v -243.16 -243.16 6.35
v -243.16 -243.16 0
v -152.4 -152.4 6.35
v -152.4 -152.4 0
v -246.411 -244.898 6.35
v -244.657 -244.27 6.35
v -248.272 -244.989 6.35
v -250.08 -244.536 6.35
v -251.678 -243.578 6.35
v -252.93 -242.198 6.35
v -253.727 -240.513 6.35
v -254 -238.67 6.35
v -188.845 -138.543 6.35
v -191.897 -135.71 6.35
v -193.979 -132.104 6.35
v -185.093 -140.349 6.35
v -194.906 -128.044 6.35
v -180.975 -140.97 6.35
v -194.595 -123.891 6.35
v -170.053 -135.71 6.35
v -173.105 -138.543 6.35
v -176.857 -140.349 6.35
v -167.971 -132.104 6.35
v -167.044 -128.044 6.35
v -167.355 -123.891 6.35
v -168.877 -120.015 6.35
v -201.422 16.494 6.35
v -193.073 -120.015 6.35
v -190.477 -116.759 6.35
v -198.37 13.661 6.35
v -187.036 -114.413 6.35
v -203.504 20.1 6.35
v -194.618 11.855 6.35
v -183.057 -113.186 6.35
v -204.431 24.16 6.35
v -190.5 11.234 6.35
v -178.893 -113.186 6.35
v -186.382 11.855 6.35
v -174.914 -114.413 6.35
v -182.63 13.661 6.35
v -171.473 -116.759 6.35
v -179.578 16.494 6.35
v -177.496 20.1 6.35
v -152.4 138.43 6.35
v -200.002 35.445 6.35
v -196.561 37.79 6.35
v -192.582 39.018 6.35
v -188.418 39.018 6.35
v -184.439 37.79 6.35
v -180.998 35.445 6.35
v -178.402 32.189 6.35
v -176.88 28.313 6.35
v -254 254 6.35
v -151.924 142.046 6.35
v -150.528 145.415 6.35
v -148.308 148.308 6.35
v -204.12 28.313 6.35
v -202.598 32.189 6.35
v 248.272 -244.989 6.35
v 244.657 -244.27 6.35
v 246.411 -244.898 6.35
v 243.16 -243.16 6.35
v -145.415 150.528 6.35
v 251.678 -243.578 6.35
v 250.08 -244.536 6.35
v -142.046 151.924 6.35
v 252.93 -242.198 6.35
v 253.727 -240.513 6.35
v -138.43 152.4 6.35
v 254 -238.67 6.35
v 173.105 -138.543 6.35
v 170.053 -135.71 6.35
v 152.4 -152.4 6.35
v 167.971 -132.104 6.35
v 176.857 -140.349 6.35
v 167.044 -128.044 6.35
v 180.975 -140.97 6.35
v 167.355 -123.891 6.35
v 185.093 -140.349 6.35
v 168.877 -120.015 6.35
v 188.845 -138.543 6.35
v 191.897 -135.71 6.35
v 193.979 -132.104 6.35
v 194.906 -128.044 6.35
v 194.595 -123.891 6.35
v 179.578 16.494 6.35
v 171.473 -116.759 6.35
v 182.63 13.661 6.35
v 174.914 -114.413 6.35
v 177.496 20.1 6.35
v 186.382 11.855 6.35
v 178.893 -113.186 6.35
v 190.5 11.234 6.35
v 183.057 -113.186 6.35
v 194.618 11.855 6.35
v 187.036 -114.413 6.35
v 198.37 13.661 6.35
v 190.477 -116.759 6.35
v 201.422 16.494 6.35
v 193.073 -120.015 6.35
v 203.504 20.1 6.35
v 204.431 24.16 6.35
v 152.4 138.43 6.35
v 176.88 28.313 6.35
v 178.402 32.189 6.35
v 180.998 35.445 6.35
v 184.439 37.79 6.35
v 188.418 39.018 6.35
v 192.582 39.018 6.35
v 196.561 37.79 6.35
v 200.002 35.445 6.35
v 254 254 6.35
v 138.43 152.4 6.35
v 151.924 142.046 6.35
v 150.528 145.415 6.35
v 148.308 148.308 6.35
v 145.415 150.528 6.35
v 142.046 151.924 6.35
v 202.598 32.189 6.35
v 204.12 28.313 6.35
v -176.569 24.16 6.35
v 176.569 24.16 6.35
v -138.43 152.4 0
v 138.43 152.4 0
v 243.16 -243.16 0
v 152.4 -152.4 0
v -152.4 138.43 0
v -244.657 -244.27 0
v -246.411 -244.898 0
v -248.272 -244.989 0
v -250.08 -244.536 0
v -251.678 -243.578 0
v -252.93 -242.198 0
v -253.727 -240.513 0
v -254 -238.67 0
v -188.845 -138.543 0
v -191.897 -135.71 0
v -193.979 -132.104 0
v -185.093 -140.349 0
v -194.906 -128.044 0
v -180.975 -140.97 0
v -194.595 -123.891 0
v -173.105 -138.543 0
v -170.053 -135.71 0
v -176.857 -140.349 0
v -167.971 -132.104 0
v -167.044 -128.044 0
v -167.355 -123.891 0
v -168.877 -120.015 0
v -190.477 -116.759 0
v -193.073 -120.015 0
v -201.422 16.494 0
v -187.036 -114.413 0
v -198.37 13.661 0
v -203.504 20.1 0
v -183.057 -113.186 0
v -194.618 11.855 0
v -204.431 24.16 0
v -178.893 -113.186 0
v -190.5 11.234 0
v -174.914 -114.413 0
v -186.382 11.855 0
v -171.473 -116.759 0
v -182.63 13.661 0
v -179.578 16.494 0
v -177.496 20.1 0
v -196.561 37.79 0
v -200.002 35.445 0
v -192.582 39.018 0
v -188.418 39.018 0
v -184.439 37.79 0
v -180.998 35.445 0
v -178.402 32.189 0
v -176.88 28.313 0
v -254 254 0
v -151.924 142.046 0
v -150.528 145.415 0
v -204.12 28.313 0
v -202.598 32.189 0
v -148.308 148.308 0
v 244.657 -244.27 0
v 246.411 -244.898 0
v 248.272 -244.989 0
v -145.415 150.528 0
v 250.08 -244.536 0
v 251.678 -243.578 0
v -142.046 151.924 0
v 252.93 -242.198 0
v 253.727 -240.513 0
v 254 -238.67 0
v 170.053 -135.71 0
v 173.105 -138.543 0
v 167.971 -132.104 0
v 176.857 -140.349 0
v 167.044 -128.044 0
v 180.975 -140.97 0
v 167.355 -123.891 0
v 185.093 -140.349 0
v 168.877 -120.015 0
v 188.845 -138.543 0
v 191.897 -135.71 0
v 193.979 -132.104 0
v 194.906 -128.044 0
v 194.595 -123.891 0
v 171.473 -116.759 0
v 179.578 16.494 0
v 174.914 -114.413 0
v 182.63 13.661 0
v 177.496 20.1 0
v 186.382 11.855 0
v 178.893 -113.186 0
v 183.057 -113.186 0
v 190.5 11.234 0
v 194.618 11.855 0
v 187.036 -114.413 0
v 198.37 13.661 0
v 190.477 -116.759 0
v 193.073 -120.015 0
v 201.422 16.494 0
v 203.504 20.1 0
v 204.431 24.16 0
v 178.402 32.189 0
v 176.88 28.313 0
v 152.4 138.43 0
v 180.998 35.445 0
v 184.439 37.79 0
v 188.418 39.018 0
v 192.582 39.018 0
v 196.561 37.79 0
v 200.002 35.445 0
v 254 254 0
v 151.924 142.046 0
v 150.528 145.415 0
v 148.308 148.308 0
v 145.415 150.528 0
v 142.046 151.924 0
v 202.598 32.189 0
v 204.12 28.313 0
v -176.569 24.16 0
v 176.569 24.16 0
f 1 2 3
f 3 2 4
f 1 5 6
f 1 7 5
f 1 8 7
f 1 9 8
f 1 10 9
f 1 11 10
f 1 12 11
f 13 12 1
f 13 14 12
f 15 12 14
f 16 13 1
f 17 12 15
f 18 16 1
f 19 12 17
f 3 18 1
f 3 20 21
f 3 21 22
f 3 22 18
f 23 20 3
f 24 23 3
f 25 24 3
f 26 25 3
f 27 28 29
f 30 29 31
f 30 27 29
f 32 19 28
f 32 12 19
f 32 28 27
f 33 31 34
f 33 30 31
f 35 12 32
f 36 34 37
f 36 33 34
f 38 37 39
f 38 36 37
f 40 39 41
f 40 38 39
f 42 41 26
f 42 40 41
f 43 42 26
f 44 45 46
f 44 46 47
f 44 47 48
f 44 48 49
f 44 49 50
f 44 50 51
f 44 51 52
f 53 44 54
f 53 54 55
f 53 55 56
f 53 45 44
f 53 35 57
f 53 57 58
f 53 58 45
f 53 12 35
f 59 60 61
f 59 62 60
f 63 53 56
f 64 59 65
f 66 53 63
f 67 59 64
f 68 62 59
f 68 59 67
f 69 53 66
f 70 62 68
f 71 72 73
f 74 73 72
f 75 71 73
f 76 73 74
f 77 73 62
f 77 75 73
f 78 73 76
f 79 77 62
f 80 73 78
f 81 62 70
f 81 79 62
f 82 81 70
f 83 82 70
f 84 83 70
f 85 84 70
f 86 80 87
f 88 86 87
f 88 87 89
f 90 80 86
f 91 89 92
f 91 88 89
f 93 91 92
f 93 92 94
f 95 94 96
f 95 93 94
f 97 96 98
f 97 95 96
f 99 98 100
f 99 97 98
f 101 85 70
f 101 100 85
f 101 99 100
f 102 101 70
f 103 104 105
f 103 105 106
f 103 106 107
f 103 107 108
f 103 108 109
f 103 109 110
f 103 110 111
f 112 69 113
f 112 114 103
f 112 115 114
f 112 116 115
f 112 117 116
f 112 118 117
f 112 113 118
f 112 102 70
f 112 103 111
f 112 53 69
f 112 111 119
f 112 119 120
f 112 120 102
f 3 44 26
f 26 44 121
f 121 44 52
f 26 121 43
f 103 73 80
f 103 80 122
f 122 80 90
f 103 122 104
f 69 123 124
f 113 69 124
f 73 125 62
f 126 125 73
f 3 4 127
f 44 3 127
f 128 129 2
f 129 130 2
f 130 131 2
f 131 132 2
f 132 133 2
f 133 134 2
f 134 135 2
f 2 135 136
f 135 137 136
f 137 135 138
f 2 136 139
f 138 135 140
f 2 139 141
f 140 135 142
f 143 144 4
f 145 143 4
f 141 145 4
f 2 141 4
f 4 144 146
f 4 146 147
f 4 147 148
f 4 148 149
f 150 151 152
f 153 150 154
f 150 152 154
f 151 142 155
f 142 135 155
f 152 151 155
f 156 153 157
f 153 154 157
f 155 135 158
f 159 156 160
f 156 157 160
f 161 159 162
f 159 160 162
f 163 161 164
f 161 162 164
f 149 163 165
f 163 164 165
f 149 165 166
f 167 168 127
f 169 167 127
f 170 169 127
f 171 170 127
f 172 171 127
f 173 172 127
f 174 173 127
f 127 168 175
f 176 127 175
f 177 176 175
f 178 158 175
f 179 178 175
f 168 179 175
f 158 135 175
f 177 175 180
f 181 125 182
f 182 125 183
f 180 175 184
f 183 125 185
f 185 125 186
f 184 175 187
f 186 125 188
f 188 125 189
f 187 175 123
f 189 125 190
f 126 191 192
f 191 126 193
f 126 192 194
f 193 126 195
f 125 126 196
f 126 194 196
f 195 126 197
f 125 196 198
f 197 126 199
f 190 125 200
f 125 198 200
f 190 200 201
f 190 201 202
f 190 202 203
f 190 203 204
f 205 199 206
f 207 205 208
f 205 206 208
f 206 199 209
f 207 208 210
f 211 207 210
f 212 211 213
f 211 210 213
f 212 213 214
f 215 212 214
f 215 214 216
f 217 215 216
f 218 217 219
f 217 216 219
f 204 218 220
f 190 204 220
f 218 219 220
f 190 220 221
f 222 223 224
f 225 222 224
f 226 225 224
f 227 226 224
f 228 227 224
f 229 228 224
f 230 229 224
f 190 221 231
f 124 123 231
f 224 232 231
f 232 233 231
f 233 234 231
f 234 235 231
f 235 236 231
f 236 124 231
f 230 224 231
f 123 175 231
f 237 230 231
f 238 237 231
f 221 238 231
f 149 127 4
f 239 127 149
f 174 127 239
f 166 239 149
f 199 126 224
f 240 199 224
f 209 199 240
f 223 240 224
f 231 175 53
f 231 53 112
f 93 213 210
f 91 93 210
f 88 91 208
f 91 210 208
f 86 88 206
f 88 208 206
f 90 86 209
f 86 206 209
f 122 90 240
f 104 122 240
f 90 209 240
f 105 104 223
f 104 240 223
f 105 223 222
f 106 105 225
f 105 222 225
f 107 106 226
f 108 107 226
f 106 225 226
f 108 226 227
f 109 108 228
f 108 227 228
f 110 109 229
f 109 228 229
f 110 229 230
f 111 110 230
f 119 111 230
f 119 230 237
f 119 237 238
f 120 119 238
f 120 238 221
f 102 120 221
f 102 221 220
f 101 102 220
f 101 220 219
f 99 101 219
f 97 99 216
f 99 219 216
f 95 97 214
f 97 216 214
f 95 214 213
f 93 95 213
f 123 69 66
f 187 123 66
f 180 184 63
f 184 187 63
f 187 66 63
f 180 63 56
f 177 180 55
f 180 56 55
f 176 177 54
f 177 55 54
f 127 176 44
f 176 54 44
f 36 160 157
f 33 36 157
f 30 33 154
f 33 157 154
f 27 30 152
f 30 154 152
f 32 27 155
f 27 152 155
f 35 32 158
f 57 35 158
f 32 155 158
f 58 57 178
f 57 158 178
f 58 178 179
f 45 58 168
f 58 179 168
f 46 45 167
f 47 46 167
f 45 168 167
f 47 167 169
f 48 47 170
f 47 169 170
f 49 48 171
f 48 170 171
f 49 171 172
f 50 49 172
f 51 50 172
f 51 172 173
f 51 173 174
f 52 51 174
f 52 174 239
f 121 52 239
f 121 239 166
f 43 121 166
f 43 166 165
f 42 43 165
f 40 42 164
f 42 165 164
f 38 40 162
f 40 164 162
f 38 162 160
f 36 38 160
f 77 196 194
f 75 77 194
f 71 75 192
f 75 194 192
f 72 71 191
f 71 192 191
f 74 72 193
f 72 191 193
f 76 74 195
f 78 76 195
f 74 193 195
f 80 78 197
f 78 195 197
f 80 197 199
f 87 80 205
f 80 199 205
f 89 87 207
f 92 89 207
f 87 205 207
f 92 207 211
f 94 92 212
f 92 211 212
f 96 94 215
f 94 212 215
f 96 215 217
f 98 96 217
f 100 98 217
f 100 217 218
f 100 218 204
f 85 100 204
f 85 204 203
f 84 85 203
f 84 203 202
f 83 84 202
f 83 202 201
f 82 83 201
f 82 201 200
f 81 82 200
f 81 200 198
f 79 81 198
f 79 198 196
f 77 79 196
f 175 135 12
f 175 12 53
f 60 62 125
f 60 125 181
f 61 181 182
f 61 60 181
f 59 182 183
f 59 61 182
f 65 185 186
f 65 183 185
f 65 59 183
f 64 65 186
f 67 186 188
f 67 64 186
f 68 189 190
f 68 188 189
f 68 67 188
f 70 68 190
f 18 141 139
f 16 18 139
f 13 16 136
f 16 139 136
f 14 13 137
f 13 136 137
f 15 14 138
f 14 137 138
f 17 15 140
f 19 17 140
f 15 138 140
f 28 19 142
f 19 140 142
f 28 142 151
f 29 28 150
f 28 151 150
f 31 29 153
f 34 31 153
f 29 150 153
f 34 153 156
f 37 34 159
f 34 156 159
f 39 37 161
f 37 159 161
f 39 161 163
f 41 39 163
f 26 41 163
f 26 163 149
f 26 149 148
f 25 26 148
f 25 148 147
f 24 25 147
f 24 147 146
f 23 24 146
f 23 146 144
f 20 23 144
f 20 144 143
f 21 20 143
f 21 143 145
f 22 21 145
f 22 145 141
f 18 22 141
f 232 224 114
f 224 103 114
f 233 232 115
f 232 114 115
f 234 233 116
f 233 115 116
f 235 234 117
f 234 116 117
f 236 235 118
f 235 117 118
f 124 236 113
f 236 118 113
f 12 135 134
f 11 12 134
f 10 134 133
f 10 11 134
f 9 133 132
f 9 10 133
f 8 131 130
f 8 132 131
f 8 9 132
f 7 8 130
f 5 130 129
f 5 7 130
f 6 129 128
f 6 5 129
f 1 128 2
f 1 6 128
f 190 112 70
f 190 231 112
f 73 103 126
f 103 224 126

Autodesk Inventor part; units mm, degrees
ref_plane "YZ Plane" through (0, 0, 0) normal (1, 0, 0) x (0, 1, 0)
ref_plane "XZ Plane" through (0, 0, 0) normal (0, 1, 0) x (-1, 0, 0)
ref_plane "XY Plane" through (0, 0, 0) normal (0, 0, 1) x (1, 0, 0)
sketch "Sketch1" plane through (0, 0, 0) normal (0, 0, 1) x (1, 0, 0)
  line L0 (-254, 254) -> (254, 254)
  line L1 (254, 254) -> (254, -254)
  line L2 (-254, -254) -> (-254, 254)
  line L3 (-254, 254) -> (254, -254) construction
  line L4 (254, 254) -> (-254, -254) construction
  line L5 (-254, -254) -> (-152.4, -152.4)
  line L6 (-152.4, -152.4) -> (-152.4, 152.4)
  line L7 (-152.4, 152.4) -> (152.4, 152.4)
  line L8 (152.4, 152.4) -> (152.4, -152.4)
  line L9 (254, -254) -> (152.4, -152.4)
  point P0 (0, 0)
  dimension "d2" = 101.6
  dimension "d3" = 101.6
  dimension "d23" = 304.8
extrude "Extrusion1" add sketch "Sketch1" along normal blind 6.35
sketch "Sketch2" plane through (0, 0, 6.35) normal (0, 0, 1) x (1, 0, 0)
  line L0 (-152.4, -152.4) -> (-152.4, 152.4) projected
  line L1 (152.4, 152.4) -> (152.4, -152.4) projected
  circle A0 centre (-180.975, -127) radius 50.8 construction
  line L2 (-254, -254) -> (-152.4, -152.4) construction
  point P0 (0, 0)
  point P1 (-190.5, 25.2039)
  point P2 (190.5, 25.2039)
  point P3 (180.975, -127)
  dimension "d6" = 28.575
  dimension "d7" = 38.1
  dimension "d8" = 38.1
  dimension "d9" = 28.575
  dimension "d18" = 152.5016
  dimension "d20" = 152.5016
  dimension "d21" = 101.6
  dimension "d25" = 127
hole "Hole1" at (-180.975, -127, 6.35) at (-190.5, 25.2039, 6.35) at (190.5, 25.2039, 6.35) at (180.975, -127, 6.35) direction (0, 0, -1) diameter 27.94 end through all
fillet "Fillet1" radius 13.97 2 edges at (-152.4, 152.4, 3.175) (152.4, 152.4, 3.175)
fillet "Fillet2" radius 6.35 2 edges at (-254, -254, 3.175) (254, -254, 3.175)
equation "\"d8\" = d7"
equation "\"d9\" = d6"
equation "\"d20\" = d18"
properties part number "AI1-001" material "Aluminum 6061"
